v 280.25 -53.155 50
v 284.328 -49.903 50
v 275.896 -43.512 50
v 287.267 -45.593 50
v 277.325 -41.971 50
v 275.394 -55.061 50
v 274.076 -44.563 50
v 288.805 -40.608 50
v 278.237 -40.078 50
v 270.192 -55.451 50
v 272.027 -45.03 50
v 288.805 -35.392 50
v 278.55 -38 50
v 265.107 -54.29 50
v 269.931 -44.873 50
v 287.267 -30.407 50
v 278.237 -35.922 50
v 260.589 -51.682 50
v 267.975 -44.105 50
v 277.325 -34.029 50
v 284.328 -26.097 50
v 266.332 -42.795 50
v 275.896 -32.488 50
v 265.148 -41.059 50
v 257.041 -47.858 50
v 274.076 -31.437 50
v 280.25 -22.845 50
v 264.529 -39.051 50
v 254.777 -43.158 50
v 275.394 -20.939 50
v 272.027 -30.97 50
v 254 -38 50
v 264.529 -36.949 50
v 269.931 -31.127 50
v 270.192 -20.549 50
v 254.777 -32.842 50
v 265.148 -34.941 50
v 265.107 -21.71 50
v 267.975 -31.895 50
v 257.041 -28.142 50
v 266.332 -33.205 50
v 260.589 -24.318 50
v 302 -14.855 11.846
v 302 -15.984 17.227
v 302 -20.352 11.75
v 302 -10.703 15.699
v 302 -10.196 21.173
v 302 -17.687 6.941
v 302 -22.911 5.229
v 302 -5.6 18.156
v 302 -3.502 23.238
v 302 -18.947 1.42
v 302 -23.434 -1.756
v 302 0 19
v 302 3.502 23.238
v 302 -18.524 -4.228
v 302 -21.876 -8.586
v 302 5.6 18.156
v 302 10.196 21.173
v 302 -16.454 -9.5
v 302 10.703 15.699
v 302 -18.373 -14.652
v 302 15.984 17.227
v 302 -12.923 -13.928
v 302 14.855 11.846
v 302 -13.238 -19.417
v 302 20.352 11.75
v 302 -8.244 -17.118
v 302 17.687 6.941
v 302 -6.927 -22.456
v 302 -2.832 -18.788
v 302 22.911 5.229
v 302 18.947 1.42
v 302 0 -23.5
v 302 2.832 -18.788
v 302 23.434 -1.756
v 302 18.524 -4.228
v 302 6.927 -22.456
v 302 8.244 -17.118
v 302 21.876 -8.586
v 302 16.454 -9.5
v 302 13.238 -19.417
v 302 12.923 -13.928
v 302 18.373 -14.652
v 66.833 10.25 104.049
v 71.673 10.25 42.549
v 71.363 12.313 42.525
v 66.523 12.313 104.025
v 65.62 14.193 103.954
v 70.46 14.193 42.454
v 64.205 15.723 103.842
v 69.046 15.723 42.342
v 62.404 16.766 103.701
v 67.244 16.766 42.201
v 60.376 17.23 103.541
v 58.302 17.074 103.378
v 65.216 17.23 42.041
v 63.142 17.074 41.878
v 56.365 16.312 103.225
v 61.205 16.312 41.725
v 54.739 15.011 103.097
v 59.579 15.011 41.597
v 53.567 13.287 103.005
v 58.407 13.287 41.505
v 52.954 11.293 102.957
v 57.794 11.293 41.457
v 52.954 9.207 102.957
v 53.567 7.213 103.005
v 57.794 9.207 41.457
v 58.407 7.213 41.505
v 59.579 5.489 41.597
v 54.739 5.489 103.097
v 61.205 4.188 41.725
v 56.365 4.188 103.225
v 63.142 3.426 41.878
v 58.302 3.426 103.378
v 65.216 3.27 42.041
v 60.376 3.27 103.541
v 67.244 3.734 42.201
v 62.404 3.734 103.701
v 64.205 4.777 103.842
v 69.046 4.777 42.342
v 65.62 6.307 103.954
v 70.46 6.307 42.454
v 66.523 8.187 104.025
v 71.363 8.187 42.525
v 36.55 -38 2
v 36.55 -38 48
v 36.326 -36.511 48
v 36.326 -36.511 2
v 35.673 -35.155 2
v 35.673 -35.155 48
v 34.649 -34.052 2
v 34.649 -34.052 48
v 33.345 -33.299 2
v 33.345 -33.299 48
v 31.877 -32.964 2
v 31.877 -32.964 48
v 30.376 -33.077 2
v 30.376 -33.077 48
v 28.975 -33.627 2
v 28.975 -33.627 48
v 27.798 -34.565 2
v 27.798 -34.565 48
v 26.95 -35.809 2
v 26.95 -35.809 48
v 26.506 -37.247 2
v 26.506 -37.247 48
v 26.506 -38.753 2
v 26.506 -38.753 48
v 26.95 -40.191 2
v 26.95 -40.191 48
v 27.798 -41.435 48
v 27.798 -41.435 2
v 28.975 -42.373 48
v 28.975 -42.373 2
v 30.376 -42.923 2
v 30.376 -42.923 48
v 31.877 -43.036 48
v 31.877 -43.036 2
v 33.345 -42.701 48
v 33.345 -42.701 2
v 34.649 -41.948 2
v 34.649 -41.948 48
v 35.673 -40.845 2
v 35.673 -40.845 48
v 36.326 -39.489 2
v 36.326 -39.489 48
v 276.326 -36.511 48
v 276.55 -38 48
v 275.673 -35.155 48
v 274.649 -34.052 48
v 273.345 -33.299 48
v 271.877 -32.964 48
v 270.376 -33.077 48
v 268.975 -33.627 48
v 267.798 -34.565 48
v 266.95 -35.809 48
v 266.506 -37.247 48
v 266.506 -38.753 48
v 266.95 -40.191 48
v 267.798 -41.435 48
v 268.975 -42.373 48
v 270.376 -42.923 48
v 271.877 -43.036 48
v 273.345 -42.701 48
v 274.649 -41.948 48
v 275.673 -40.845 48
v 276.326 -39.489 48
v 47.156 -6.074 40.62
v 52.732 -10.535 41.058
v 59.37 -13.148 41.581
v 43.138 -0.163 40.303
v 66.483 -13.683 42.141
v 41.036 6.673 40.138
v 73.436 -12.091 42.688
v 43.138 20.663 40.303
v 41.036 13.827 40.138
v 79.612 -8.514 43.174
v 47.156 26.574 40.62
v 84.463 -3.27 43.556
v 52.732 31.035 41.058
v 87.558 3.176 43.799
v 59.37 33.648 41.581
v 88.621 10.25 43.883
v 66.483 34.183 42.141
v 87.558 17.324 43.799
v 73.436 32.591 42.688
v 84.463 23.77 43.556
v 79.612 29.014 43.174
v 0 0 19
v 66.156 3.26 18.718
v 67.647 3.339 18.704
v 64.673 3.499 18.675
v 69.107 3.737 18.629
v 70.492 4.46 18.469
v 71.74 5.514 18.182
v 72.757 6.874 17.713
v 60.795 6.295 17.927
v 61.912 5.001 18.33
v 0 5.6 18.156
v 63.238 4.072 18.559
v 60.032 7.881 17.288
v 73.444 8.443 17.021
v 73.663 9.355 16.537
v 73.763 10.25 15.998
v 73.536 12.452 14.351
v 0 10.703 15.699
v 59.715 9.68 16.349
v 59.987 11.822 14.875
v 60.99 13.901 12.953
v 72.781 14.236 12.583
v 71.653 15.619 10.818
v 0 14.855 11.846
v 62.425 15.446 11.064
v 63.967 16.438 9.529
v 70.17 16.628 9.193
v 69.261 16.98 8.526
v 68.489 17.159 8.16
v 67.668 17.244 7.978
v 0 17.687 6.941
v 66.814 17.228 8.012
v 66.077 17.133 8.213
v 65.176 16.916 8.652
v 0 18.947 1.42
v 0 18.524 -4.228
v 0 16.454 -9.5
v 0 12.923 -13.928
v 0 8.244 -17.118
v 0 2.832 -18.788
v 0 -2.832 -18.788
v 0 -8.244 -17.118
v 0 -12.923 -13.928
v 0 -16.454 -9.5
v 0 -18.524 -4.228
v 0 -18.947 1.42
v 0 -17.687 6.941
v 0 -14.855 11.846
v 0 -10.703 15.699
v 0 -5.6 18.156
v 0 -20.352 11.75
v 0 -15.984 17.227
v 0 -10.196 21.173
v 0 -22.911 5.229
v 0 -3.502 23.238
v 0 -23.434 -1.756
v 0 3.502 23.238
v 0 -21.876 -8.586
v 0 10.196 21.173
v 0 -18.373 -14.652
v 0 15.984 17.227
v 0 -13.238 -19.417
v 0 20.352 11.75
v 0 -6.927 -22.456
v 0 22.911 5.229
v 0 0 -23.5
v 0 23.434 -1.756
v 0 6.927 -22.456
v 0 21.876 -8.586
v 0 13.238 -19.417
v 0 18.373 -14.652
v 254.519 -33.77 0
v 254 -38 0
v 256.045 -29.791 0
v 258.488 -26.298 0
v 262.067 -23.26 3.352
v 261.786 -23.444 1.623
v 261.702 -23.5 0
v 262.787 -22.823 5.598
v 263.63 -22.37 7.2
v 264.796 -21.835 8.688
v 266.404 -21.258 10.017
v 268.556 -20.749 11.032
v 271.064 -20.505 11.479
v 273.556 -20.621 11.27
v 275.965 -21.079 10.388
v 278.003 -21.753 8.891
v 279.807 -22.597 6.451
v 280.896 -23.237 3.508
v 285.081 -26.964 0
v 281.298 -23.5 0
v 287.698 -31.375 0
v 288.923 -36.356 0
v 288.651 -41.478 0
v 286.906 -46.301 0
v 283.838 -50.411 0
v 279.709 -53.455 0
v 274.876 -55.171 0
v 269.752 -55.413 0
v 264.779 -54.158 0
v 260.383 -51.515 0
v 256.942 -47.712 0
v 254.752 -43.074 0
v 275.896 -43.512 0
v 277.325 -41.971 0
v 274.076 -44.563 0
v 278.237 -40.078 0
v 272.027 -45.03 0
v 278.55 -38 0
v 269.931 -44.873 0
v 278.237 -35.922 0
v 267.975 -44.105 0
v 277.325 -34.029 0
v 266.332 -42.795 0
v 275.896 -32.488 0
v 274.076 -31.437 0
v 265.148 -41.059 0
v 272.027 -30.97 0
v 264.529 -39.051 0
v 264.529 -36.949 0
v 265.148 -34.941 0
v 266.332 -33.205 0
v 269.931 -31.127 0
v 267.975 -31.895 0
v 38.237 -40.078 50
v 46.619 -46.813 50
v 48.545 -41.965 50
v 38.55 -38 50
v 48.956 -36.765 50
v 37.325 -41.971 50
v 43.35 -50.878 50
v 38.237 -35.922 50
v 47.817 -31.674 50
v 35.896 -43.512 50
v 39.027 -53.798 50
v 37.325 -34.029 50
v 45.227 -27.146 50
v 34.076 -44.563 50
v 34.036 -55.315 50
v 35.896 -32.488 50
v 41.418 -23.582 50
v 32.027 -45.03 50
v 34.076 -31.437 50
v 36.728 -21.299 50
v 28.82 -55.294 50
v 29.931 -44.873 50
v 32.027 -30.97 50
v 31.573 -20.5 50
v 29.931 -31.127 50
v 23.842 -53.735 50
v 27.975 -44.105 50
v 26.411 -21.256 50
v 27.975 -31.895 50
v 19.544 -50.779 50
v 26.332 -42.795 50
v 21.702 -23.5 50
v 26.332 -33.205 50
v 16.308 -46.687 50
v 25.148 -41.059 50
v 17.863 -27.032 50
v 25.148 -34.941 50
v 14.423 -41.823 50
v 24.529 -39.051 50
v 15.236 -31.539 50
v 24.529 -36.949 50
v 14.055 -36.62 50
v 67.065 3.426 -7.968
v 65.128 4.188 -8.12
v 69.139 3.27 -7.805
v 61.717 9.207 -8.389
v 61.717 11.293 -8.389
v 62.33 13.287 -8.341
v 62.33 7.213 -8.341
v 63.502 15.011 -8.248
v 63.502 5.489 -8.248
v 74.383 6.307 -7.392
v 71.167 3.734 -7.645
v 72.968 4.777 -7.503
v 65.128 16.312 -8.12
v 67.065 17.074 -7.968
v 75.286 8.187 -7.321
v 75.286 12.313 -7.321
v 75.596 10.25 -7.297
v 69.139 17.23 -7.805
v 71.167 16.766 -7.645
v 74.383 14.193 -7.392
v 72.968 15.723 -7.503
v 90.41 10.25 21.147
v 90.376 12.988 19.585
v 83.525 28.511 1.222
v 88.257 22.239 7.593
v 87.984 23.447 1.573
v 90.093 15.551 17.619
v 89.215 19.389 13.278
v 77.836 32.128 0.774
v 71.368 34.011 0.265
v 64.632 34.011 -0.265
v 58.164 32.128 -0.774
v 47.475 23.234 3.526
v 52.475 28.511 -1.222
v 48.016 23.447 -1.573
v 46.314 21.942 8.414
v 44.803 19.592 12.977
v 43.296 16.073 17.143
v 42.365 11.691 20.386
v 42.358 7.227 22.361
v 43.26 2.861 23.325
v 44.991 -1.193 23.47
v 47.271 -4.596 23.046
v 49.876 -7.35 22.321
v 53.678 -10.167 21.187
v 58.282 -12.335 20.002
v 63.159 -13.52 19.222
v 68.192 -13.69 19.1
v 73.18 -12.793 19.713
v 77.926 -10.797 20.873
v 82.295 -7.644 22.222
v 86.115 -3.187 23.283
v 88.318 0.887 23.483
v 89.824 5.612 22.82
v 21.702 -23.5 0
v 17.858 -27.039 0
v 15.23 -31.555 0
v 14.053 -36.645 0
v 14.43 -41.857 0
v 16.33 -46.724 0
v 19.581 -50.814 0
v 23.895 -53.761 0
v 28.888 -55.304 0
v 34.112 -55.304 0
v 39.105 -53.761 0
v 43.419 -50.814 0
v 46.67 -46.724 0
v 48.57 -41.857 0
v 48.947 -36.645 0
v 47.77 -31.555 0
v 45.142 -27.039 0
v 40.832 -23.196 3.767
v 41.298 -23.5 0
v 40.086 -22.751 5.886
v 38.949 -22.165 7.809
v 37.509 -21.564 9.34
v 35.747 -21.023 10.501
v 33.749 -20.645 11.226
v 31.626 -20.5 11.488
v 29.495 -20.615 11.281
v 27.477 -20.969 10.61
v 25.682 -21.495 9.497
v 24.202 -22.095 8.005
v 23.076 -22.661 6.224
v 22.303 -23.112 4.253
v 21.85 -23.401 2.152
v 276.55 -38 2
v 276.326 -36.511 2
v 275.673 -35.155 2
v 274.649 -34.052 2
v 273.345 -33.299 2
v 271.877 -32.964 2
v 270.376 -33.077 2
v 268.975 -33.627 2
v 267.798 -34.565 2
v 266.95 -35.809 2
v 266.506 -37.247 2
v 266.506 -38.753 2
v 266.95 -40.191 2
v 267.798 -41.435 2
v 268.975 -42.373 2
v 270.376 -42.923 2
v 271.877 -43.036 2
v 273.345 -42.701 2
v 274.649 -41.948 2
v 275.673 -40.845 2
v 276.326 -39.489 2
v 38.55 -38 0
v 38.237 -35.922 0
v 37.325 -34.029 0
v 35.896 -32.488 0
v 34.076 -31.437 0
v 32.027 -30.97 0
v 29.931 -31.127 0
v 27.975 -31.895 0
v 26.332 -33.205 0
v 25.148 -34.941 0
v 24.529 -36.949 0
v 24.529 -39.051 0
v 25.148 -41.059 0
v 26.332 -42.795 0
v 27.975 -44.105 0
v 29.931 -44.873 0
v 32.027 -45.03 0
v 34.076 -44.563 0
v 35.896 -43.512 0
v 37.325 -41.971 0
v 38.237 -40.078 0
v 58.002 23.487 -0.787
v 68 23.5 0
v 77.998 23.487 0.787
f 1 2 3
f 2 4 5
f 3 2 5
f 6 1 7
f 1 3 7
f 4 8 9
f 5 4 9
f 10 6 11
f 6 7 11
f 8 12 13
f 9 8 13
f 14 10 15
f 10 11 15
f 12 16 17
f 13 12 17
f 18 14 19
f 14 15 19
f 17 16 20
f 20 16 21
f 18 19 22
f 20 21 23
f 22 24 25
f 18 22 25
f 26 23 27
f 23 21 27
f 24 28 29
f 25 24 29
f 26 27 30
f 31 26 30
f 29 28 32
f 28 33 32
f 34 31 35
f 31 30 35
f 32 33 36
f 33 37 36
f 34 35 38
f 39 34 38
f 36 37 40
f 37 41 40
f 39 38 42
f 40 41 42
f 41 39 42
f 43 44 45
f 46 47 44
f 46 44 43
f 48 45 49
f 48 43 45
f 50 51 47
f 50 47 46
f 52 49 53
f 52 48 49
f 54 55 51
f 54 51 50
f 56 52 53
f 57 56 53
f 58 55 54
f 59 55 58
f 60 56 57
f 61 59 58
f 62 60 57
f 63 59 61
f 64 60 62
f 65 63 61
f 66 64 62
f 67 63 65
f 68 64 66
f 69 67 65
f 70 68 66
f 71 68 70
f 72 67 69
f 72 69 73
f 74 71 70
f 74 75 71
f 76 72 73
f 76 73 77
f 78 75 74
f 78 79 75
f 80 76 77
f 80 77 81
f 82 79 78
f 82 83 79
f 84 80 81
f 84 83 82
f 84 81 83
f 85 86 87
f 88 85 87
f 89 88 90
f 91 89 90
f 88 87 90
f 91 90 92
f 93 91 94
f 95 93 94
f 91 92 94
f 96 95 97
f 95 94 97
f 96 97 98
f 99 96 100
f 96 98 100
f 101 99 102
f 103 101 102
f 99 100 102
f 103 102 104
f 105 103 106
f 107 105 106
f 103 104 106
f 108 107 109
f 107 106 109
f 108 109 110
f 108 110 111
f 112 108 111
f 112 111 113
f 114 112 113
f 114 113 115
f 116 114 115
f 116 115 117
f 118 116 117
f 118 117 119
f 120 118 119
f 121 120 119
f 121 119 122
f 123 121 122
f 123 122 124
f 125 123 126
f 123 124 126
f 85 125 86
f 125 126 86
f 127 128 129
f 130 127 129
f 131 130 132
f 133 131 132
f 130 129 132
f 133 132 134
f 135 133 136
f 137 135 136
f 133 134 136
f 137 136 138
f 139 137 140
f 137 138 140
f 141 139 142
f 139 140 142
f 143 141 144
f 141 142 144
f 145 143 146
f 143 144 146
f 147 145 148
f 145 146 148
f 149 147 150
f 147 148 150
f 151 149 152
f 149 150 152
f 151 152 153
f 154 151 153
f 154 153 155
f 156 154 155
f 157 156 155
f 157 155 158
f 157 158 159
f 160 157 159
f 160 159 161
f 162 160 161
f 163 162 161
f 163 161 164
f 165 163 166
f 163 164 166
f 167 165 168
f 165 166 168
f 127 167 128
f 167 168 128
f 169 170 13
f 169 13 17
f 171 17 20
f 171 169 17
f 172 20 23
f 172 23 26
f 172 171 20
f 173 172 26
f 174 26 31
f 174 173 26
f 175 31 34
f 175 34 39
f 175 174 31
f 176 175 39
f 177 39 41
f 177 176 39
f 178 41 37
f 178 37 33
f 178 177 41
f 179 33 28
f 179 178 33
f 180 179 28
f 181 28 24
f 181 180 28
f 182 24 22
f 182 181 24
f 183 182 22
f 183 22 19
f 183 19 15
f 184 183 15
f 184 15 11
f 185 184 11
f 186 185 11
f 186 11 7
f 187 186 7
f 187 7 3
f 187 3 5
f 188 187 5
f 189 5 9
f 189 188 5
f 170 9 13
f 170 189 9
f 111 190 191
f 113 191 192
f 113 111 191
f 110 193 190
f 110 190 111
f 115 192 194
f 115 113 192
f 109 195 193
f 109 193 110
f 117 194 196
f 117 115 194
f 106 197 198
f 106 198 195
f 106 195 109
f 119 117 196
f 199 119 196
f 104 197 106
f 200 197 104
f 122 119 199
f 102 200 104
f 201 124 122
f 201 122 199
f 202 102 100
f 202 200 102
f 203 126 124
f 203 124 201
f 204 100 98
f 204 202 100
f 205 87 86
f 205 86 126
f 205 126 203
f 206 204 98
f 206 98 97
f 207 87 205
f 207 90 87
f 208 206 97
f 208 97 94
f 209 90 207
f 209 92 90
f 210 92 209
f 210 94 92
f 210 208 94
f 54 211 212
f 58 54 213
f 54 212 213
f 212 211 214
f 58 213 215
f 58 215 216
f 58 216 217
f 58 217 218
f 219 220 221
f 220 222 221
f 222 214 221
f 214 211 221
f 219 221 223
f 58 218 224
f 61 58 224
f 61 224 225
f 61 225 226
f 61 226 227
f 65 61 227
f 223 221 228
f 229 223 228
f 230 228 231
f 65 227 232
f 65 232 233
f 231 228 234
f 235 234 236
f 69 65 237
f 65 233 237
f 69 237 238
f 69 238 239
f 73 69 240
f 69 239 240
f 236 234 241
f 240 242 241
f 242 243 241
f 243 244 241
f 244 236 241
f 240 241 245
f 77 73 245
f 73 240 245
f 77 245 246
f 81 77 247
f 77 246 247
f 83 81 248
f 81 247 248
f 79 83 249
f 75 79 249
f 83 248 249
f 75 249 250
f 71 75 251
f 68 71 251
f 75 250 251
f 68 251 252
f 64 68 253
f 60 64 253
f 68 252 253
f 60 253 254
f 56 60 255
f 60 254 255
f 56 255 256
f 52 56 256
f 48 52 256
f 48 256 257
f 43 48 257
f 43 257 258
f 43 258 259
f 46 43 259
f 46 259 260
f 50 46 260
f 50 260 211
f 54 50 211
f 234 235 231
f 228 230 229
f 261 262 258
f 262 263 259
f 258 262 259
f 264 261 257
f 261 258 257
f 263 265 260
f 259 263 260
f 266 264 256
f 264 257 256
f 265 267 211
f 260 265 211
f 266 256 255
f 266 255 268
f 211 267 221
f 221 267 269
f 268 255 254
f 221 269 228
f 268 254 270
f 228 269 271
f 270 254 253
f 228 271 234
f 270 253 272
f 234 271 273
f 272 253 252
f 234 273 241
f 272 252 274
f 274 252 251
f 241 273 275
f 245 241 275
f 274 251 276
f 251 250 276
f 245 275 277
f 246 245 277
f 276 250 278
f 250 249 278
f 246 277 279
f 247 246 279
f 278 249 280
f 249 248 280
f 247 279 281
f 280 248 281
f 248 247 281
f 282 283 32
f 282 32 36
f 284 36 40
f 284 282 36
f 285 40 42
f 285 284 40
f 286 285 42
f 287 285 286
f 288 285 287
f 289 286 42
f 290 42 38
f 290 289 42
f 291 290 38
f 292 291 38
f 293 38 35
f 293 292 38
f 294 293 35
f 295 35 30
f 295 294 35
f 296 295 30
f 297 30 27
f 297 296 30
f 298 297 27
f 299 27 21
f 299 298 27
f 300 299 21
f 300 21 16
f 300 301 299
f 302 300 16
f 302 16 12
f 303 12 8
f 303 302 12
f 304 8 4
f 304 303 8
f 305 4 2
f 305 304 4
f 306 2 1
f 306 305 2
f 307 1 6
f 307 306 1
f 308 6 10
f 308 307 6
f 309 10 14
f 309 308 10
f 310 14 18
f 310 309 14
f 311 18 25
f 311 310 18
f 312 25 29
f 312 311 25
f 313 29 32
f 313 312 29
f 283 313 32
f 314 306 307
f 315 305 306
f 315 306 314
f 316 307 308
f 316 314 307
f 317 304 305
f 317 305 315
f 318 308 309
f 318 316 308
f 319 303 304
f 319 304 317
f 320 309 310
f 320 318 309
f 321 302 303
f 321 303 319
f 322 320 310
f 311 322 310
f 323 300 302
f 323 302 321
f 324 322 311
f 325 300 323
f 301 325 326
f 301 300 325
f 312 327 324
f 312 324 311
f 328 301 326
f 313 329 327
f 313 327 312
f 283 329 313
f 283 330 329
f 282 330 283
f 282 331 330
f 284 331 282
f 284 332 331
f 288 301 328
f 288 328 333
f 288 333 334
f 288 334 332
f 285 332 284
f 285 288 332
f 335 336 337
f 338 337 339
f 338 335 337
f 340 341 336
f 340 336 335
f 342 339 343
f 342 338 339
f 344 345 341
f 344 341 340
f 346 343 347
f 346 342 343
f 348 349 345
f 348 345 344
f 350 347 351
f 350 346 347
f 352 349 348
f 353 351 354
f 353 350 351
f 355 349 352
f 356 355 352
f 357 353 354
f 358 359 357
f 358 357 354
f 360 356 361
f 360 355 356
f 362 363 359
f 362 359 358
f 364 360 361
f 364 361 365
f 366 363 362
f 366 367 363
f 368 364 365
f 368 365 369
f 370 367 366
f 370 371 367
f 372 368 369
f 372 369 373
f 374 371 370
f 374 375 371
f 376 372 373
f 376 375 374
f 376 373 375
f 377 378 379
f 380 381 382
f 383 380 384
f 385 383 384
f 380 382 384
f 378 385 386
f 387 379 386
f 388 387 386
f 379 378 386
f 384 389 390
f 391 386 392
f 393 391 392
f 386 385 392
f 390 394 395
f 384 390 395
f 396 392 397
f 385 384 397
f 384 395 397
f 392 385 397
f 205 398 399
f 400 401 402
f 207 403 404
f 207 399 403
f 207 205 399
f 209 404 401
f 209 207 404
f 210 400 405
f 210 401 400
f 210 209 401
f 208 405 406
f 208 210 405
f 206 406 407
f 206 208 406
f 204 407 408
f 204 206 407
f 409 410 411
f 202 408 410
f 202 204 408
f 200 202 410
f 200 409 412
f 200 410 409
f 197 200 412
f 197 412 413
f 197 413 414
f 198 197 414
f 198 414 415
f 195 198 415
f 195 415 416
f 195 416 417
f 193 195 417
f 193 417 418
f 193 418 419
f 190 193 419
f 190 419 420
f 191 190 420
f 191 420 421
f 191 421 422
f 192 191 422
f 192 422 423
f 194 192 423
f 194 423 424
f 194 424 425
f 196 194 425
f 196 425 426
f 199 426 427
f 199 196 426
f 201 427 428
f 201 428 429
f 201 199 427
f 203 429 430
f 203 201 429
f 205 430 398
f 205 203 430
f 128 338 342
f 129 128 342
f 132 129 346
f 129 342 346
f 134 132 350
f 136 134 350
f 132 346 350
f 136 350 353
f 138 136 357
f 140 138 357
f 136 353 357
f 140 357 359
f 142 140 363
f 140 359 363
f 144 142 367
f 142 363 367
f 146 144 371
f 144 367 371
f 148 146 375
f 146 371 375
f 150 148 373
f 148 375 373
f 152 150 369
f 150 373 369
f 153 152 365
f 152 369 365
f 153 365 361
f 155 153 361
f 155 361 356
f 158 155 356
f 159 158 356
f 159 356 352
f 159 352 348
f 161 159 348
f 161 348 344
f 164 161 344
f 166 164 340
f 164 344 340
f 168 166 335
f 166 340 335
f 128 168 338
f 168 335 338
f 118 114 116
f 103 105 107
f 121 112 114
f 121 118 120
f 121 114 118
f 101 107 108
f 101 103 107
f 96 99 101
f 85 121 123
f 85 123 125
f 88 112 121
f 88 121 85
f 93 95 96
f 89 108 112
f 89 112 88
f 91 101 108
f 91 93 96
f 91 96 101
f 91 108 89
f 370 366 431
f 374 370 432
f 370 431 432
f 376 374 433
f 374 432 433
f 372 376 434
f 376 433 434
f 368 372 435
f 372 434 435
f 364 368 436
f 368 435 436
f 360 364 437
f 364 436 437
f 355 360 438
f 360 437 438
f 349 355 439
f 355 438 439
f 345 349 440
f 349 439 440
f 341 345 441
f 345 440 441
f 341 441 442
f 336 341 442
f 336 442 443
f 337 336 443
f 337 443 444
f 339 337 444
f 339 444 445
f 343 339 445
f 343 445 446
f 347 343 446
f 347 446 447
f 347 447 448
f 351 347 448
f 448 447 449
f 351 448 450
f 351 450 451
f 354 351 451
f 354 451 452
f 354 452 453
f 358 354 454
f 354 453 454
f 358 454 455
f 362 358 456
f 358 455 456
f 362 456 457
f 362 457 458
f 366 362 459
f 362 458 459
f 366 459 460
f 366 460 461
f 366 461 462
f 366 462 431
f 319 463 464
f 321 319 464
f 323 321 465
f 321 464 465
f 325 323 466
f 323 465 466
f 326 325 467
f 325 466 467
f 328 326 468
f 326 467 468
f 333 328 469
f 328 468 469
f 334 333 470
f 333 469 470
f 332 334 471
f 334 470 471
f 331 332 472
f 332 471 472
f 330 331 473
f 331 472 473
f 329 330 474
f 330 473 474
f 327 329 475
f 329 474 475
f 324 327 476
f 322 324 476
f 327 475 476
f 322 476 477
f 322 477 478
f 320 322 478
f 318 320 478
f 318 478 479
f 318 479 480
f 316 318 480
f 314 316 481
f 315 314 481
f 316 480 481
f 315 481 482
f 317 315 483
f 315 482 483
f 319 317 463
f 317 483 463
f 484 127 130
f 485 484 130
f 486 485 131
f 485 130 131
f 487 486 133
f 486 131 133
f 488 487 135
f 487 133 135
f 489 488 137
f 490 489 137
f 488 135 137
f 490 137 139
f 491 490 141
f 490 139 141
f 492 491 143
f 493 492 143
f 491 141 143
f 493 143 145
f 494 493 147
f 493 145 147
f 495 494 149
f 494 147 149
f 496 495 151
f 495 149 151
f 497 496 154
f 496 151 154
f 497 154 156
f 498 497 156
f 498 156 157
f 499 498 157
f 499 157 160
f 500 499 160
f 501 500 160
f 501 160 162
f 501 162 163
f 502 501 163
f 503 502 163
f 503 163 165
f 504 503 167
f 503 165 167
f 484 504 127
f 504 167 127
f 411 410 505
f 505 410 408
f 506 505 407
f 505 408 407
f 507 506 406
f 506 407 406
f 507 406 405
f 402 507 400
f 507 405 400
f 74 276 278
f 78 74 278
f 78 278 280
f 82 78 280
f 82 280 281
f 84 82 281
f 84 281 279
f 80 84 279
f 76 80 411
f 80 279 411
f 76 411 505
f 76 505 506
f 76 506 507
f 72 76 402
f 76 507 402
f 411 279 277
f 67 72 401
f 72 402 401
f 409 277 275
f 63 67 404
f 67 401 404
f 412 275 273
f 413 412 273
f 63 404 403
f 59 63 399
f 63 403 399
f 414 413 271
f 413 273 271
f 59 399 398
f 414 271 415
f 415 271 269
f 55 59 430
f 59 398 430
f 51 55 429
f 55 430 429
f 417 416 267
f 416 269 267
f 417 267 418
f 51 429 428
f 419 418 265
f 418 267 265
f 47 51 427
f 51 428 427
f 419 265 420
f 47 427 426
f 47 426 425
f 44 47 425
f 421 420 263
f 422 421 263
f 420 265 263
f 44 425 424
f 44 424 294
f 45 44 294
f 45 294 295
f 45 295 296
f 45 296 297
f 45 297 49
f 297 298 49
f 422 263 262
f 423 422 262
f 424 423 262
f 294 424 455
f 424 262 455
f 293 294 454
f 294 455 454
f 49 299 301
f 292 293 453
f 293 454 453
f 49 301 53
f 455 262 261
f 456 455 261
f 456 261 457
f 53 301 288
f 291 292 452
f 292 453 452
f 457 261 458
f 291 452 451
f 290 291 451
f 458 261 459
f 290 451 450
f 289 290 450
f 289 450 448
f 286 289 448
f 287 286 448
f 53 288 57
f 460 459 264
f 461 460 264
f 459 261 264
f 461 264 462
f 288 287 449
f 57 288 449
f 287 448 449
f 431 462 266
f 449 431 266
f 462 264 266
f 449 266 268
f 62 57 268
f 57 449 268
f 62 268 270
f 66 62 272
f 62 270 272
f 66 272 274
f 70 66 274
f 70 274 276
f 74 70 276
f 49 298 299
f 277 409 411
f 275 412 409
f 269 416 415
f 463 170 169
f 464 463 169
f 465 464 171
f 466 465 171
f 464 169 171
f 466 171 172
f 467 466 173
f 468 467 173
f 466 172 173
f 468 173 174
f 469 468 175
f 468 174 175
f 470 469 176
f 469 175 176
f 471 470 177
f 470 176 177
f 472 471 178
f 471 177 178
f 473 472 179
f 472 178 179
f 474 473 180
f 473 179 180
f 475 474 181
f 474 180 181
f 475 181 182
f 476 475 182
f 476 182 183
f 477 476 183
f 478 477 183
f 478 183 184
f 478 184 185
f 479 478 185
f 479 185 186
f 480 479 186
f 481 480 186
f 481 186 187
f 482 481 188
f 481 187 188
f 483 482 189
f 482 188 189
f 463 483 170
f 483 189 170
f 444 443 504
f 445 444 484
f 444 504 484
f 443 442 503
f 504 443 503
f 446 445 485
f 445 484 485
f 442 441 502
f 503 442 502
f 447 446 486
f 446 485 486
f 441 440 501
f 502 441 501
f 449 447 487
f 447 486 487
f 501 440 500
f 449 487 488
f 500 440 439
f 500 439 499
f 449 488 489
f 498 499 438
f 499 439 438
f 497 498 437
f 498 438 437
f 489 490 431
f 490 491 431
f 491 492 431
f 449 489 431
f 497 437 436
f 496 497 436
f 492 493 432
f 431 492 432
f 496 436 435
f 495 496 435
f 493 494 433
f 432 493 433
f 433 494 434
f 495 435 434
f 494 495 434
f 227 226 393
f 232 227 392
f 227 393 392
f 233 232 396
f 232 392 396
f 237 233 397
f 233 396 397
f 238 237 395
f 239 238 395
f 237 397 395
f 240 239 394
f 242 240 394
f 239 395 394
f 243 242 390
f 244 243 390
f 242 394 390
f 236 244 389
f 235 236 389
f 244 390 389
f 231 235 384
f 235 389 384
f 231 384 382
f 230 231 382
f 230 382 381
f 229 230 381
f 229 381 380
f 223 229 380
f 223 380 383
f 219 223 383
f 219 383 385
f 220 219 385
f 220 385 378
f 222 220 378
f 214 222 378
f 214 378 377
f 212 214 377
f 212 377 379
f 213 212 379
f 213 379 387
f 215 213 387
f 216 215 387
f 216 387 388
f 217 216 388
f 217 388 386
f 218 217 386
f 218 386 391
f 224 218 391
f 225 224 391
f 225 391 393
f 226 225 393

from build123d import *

# Parameters (mm, degrees)
SZKIC1_R                    = 23.5
DODANIE_WYCI_GNI_CIE1_DEPTH = 302
SZKIC2_R                    = 17.5
DODANIE_WYCI_GNI_CIE2_DEPTH = 50
SZKIC4_R                    = 17.5
DODANIE_WYCI_GNI_CIE3_DEPTH = 50
SZKIC5_R                    = 5.05
WYTNIJ_WYCI_GNI_CIE1_DEPTH  = 50
SFAZOWANIE1_SIZE            = 2
SZKIC8_R                    = 24
DODANIE_WYCI_GNI_CIE4_DEPTH = 42.129872
SZKIC12_R                   = 7
DODANIE_WYCI_GNI_CIE5_DEPTH = 61.69017
SZKIC6_R                    = 19
WYTNIJ_WYCI_GNI_CIE2_DEPTH  = 302
DODANIE_WYCI_GNI_CIE6_START = -50
SZKIC13_R                   = 7
DODANIE_WYCI_GNI_CIE6_DEPTH = 50


with BuildPart() as part:
    # Szkic1 → Dodanie-wyciągnięcie1 (new body)
    with BuildSketch(Plane(origin=(0, 0, 0), x_dir=(0, 0, -1), z_dir=(1, 0, 0))):
        Circle(SZKIC1_R)
    extrude(amount=DODANIE_WYCI_GNI_CIE1_DEPTH)

    # Szkic2 → Dodanie-wyciągnięcie2 (add)
    with BuildSketch(Plane.XY):
        with Locations(Location((31.5, -38, 0), (0, 0, 124.04773237))):
            Circle(SZKIC2_R)
    extrude(amount=DODANIE_WYCI_GNI_CIE2_DEPTH)

    # Szkic4 → Dodanie-wyciągnięcie3 (add)
    with BuildSketch(Plane(origin=(0, 0, 0), x_dir=(-1, 0, 0), z_dir=(0, 0, -1))):
        with Locations((-271.5, -38)):
            Circle(SZKIC4_R)
    extrude(amount=-DODANIE_WYCI_GNI_CIE3_DEPTH)

    # Szkic5 → Wytnij-wyciągnięcie1 (cut)
    with BuildSketch(Plane.XY.offset(50)):
        with Locations((31.5, -38)):
            Circle(SZKIC5_R)
        with Locations((271.5, -38)):
            Circle(SZKIC5_R)
    extrude(amount=-WYTNIJ_WYCI_GNI_CIE1_DEPTH, mode=Mode.SUBTRACT)

    # Sfazowanie1
    sfazowanie1_edges = [part.edges().sort_by_distance(p)[0] for p in [
        (26.45, -38, 0),
        (26.45, -38, 50),
        (266.45, -38, 0),
        (266.45, -38, 50),
    ]]
    chamfer(sfazowanie1_edges, length=SFAZOWANIE1_SIZE)

    # Szkic8 → Dodanie-wyciągnięcie4 (add)
    with BuildSketch(Plane(origin=(64.694528313, 23.5, 42), x_dir=(0.9969173337331281, 0, 0.07845909572784458), z_dir=(-0.07845909572784458, 0, 0.9969173337331281))):
        with Locations((0, -13.25)):
            Circle(SZKIC8_R)
    extrude(amount=-DODANIE_WYCI_GNI_CIE4_DEPTH)

    # Szkic12 → Dodanie-wyciągnięcie5 (add)
    with BuildSketch(Plane(origin=(-2.886875267, 0, 36.681228189), x_dir=(0.9969173337331281, 0, 0.07845909572784461), z_dir=(-0.07845909572784461, 0, 0.9969173337331281))):
        with Locations((67.790378694, 10.25)):
            Circle(SZKIC12_R)
    extrude(amount=DODANIE_WYCI_GNI_CIE5_DEPTH)

    # Szkic6 → Wytnij-wyciągnięcie2 (cut)
    with BuildSketch(Plane.ZY):
        Circle(SZKIC6_R)
    extrude(amount=-WYTNIJ_WYCI_GNI_CIE2_DEPTH, mode=Mode.SUBTRACT)

    # Szkic13 → Dodanie-wyciągnięcie6 (add)
    with BuildSketch(Plane(origin=(64.694528313, 23.5, 42), x_dir=(0.9969173337331281, 0, 0.07845909572784458), z_dir=(-0.07845909572784458, 0, 0.9969173337331281)).offset(DODANIE_WYCI_GNI_CIE6_START)):
        with Locations((0, -13.25)):
            Circle(SZKIC13_R)
    extrude(amount=DODANIE_WYCI_GNI_CIE6_DEPTH)


solid = part.part
